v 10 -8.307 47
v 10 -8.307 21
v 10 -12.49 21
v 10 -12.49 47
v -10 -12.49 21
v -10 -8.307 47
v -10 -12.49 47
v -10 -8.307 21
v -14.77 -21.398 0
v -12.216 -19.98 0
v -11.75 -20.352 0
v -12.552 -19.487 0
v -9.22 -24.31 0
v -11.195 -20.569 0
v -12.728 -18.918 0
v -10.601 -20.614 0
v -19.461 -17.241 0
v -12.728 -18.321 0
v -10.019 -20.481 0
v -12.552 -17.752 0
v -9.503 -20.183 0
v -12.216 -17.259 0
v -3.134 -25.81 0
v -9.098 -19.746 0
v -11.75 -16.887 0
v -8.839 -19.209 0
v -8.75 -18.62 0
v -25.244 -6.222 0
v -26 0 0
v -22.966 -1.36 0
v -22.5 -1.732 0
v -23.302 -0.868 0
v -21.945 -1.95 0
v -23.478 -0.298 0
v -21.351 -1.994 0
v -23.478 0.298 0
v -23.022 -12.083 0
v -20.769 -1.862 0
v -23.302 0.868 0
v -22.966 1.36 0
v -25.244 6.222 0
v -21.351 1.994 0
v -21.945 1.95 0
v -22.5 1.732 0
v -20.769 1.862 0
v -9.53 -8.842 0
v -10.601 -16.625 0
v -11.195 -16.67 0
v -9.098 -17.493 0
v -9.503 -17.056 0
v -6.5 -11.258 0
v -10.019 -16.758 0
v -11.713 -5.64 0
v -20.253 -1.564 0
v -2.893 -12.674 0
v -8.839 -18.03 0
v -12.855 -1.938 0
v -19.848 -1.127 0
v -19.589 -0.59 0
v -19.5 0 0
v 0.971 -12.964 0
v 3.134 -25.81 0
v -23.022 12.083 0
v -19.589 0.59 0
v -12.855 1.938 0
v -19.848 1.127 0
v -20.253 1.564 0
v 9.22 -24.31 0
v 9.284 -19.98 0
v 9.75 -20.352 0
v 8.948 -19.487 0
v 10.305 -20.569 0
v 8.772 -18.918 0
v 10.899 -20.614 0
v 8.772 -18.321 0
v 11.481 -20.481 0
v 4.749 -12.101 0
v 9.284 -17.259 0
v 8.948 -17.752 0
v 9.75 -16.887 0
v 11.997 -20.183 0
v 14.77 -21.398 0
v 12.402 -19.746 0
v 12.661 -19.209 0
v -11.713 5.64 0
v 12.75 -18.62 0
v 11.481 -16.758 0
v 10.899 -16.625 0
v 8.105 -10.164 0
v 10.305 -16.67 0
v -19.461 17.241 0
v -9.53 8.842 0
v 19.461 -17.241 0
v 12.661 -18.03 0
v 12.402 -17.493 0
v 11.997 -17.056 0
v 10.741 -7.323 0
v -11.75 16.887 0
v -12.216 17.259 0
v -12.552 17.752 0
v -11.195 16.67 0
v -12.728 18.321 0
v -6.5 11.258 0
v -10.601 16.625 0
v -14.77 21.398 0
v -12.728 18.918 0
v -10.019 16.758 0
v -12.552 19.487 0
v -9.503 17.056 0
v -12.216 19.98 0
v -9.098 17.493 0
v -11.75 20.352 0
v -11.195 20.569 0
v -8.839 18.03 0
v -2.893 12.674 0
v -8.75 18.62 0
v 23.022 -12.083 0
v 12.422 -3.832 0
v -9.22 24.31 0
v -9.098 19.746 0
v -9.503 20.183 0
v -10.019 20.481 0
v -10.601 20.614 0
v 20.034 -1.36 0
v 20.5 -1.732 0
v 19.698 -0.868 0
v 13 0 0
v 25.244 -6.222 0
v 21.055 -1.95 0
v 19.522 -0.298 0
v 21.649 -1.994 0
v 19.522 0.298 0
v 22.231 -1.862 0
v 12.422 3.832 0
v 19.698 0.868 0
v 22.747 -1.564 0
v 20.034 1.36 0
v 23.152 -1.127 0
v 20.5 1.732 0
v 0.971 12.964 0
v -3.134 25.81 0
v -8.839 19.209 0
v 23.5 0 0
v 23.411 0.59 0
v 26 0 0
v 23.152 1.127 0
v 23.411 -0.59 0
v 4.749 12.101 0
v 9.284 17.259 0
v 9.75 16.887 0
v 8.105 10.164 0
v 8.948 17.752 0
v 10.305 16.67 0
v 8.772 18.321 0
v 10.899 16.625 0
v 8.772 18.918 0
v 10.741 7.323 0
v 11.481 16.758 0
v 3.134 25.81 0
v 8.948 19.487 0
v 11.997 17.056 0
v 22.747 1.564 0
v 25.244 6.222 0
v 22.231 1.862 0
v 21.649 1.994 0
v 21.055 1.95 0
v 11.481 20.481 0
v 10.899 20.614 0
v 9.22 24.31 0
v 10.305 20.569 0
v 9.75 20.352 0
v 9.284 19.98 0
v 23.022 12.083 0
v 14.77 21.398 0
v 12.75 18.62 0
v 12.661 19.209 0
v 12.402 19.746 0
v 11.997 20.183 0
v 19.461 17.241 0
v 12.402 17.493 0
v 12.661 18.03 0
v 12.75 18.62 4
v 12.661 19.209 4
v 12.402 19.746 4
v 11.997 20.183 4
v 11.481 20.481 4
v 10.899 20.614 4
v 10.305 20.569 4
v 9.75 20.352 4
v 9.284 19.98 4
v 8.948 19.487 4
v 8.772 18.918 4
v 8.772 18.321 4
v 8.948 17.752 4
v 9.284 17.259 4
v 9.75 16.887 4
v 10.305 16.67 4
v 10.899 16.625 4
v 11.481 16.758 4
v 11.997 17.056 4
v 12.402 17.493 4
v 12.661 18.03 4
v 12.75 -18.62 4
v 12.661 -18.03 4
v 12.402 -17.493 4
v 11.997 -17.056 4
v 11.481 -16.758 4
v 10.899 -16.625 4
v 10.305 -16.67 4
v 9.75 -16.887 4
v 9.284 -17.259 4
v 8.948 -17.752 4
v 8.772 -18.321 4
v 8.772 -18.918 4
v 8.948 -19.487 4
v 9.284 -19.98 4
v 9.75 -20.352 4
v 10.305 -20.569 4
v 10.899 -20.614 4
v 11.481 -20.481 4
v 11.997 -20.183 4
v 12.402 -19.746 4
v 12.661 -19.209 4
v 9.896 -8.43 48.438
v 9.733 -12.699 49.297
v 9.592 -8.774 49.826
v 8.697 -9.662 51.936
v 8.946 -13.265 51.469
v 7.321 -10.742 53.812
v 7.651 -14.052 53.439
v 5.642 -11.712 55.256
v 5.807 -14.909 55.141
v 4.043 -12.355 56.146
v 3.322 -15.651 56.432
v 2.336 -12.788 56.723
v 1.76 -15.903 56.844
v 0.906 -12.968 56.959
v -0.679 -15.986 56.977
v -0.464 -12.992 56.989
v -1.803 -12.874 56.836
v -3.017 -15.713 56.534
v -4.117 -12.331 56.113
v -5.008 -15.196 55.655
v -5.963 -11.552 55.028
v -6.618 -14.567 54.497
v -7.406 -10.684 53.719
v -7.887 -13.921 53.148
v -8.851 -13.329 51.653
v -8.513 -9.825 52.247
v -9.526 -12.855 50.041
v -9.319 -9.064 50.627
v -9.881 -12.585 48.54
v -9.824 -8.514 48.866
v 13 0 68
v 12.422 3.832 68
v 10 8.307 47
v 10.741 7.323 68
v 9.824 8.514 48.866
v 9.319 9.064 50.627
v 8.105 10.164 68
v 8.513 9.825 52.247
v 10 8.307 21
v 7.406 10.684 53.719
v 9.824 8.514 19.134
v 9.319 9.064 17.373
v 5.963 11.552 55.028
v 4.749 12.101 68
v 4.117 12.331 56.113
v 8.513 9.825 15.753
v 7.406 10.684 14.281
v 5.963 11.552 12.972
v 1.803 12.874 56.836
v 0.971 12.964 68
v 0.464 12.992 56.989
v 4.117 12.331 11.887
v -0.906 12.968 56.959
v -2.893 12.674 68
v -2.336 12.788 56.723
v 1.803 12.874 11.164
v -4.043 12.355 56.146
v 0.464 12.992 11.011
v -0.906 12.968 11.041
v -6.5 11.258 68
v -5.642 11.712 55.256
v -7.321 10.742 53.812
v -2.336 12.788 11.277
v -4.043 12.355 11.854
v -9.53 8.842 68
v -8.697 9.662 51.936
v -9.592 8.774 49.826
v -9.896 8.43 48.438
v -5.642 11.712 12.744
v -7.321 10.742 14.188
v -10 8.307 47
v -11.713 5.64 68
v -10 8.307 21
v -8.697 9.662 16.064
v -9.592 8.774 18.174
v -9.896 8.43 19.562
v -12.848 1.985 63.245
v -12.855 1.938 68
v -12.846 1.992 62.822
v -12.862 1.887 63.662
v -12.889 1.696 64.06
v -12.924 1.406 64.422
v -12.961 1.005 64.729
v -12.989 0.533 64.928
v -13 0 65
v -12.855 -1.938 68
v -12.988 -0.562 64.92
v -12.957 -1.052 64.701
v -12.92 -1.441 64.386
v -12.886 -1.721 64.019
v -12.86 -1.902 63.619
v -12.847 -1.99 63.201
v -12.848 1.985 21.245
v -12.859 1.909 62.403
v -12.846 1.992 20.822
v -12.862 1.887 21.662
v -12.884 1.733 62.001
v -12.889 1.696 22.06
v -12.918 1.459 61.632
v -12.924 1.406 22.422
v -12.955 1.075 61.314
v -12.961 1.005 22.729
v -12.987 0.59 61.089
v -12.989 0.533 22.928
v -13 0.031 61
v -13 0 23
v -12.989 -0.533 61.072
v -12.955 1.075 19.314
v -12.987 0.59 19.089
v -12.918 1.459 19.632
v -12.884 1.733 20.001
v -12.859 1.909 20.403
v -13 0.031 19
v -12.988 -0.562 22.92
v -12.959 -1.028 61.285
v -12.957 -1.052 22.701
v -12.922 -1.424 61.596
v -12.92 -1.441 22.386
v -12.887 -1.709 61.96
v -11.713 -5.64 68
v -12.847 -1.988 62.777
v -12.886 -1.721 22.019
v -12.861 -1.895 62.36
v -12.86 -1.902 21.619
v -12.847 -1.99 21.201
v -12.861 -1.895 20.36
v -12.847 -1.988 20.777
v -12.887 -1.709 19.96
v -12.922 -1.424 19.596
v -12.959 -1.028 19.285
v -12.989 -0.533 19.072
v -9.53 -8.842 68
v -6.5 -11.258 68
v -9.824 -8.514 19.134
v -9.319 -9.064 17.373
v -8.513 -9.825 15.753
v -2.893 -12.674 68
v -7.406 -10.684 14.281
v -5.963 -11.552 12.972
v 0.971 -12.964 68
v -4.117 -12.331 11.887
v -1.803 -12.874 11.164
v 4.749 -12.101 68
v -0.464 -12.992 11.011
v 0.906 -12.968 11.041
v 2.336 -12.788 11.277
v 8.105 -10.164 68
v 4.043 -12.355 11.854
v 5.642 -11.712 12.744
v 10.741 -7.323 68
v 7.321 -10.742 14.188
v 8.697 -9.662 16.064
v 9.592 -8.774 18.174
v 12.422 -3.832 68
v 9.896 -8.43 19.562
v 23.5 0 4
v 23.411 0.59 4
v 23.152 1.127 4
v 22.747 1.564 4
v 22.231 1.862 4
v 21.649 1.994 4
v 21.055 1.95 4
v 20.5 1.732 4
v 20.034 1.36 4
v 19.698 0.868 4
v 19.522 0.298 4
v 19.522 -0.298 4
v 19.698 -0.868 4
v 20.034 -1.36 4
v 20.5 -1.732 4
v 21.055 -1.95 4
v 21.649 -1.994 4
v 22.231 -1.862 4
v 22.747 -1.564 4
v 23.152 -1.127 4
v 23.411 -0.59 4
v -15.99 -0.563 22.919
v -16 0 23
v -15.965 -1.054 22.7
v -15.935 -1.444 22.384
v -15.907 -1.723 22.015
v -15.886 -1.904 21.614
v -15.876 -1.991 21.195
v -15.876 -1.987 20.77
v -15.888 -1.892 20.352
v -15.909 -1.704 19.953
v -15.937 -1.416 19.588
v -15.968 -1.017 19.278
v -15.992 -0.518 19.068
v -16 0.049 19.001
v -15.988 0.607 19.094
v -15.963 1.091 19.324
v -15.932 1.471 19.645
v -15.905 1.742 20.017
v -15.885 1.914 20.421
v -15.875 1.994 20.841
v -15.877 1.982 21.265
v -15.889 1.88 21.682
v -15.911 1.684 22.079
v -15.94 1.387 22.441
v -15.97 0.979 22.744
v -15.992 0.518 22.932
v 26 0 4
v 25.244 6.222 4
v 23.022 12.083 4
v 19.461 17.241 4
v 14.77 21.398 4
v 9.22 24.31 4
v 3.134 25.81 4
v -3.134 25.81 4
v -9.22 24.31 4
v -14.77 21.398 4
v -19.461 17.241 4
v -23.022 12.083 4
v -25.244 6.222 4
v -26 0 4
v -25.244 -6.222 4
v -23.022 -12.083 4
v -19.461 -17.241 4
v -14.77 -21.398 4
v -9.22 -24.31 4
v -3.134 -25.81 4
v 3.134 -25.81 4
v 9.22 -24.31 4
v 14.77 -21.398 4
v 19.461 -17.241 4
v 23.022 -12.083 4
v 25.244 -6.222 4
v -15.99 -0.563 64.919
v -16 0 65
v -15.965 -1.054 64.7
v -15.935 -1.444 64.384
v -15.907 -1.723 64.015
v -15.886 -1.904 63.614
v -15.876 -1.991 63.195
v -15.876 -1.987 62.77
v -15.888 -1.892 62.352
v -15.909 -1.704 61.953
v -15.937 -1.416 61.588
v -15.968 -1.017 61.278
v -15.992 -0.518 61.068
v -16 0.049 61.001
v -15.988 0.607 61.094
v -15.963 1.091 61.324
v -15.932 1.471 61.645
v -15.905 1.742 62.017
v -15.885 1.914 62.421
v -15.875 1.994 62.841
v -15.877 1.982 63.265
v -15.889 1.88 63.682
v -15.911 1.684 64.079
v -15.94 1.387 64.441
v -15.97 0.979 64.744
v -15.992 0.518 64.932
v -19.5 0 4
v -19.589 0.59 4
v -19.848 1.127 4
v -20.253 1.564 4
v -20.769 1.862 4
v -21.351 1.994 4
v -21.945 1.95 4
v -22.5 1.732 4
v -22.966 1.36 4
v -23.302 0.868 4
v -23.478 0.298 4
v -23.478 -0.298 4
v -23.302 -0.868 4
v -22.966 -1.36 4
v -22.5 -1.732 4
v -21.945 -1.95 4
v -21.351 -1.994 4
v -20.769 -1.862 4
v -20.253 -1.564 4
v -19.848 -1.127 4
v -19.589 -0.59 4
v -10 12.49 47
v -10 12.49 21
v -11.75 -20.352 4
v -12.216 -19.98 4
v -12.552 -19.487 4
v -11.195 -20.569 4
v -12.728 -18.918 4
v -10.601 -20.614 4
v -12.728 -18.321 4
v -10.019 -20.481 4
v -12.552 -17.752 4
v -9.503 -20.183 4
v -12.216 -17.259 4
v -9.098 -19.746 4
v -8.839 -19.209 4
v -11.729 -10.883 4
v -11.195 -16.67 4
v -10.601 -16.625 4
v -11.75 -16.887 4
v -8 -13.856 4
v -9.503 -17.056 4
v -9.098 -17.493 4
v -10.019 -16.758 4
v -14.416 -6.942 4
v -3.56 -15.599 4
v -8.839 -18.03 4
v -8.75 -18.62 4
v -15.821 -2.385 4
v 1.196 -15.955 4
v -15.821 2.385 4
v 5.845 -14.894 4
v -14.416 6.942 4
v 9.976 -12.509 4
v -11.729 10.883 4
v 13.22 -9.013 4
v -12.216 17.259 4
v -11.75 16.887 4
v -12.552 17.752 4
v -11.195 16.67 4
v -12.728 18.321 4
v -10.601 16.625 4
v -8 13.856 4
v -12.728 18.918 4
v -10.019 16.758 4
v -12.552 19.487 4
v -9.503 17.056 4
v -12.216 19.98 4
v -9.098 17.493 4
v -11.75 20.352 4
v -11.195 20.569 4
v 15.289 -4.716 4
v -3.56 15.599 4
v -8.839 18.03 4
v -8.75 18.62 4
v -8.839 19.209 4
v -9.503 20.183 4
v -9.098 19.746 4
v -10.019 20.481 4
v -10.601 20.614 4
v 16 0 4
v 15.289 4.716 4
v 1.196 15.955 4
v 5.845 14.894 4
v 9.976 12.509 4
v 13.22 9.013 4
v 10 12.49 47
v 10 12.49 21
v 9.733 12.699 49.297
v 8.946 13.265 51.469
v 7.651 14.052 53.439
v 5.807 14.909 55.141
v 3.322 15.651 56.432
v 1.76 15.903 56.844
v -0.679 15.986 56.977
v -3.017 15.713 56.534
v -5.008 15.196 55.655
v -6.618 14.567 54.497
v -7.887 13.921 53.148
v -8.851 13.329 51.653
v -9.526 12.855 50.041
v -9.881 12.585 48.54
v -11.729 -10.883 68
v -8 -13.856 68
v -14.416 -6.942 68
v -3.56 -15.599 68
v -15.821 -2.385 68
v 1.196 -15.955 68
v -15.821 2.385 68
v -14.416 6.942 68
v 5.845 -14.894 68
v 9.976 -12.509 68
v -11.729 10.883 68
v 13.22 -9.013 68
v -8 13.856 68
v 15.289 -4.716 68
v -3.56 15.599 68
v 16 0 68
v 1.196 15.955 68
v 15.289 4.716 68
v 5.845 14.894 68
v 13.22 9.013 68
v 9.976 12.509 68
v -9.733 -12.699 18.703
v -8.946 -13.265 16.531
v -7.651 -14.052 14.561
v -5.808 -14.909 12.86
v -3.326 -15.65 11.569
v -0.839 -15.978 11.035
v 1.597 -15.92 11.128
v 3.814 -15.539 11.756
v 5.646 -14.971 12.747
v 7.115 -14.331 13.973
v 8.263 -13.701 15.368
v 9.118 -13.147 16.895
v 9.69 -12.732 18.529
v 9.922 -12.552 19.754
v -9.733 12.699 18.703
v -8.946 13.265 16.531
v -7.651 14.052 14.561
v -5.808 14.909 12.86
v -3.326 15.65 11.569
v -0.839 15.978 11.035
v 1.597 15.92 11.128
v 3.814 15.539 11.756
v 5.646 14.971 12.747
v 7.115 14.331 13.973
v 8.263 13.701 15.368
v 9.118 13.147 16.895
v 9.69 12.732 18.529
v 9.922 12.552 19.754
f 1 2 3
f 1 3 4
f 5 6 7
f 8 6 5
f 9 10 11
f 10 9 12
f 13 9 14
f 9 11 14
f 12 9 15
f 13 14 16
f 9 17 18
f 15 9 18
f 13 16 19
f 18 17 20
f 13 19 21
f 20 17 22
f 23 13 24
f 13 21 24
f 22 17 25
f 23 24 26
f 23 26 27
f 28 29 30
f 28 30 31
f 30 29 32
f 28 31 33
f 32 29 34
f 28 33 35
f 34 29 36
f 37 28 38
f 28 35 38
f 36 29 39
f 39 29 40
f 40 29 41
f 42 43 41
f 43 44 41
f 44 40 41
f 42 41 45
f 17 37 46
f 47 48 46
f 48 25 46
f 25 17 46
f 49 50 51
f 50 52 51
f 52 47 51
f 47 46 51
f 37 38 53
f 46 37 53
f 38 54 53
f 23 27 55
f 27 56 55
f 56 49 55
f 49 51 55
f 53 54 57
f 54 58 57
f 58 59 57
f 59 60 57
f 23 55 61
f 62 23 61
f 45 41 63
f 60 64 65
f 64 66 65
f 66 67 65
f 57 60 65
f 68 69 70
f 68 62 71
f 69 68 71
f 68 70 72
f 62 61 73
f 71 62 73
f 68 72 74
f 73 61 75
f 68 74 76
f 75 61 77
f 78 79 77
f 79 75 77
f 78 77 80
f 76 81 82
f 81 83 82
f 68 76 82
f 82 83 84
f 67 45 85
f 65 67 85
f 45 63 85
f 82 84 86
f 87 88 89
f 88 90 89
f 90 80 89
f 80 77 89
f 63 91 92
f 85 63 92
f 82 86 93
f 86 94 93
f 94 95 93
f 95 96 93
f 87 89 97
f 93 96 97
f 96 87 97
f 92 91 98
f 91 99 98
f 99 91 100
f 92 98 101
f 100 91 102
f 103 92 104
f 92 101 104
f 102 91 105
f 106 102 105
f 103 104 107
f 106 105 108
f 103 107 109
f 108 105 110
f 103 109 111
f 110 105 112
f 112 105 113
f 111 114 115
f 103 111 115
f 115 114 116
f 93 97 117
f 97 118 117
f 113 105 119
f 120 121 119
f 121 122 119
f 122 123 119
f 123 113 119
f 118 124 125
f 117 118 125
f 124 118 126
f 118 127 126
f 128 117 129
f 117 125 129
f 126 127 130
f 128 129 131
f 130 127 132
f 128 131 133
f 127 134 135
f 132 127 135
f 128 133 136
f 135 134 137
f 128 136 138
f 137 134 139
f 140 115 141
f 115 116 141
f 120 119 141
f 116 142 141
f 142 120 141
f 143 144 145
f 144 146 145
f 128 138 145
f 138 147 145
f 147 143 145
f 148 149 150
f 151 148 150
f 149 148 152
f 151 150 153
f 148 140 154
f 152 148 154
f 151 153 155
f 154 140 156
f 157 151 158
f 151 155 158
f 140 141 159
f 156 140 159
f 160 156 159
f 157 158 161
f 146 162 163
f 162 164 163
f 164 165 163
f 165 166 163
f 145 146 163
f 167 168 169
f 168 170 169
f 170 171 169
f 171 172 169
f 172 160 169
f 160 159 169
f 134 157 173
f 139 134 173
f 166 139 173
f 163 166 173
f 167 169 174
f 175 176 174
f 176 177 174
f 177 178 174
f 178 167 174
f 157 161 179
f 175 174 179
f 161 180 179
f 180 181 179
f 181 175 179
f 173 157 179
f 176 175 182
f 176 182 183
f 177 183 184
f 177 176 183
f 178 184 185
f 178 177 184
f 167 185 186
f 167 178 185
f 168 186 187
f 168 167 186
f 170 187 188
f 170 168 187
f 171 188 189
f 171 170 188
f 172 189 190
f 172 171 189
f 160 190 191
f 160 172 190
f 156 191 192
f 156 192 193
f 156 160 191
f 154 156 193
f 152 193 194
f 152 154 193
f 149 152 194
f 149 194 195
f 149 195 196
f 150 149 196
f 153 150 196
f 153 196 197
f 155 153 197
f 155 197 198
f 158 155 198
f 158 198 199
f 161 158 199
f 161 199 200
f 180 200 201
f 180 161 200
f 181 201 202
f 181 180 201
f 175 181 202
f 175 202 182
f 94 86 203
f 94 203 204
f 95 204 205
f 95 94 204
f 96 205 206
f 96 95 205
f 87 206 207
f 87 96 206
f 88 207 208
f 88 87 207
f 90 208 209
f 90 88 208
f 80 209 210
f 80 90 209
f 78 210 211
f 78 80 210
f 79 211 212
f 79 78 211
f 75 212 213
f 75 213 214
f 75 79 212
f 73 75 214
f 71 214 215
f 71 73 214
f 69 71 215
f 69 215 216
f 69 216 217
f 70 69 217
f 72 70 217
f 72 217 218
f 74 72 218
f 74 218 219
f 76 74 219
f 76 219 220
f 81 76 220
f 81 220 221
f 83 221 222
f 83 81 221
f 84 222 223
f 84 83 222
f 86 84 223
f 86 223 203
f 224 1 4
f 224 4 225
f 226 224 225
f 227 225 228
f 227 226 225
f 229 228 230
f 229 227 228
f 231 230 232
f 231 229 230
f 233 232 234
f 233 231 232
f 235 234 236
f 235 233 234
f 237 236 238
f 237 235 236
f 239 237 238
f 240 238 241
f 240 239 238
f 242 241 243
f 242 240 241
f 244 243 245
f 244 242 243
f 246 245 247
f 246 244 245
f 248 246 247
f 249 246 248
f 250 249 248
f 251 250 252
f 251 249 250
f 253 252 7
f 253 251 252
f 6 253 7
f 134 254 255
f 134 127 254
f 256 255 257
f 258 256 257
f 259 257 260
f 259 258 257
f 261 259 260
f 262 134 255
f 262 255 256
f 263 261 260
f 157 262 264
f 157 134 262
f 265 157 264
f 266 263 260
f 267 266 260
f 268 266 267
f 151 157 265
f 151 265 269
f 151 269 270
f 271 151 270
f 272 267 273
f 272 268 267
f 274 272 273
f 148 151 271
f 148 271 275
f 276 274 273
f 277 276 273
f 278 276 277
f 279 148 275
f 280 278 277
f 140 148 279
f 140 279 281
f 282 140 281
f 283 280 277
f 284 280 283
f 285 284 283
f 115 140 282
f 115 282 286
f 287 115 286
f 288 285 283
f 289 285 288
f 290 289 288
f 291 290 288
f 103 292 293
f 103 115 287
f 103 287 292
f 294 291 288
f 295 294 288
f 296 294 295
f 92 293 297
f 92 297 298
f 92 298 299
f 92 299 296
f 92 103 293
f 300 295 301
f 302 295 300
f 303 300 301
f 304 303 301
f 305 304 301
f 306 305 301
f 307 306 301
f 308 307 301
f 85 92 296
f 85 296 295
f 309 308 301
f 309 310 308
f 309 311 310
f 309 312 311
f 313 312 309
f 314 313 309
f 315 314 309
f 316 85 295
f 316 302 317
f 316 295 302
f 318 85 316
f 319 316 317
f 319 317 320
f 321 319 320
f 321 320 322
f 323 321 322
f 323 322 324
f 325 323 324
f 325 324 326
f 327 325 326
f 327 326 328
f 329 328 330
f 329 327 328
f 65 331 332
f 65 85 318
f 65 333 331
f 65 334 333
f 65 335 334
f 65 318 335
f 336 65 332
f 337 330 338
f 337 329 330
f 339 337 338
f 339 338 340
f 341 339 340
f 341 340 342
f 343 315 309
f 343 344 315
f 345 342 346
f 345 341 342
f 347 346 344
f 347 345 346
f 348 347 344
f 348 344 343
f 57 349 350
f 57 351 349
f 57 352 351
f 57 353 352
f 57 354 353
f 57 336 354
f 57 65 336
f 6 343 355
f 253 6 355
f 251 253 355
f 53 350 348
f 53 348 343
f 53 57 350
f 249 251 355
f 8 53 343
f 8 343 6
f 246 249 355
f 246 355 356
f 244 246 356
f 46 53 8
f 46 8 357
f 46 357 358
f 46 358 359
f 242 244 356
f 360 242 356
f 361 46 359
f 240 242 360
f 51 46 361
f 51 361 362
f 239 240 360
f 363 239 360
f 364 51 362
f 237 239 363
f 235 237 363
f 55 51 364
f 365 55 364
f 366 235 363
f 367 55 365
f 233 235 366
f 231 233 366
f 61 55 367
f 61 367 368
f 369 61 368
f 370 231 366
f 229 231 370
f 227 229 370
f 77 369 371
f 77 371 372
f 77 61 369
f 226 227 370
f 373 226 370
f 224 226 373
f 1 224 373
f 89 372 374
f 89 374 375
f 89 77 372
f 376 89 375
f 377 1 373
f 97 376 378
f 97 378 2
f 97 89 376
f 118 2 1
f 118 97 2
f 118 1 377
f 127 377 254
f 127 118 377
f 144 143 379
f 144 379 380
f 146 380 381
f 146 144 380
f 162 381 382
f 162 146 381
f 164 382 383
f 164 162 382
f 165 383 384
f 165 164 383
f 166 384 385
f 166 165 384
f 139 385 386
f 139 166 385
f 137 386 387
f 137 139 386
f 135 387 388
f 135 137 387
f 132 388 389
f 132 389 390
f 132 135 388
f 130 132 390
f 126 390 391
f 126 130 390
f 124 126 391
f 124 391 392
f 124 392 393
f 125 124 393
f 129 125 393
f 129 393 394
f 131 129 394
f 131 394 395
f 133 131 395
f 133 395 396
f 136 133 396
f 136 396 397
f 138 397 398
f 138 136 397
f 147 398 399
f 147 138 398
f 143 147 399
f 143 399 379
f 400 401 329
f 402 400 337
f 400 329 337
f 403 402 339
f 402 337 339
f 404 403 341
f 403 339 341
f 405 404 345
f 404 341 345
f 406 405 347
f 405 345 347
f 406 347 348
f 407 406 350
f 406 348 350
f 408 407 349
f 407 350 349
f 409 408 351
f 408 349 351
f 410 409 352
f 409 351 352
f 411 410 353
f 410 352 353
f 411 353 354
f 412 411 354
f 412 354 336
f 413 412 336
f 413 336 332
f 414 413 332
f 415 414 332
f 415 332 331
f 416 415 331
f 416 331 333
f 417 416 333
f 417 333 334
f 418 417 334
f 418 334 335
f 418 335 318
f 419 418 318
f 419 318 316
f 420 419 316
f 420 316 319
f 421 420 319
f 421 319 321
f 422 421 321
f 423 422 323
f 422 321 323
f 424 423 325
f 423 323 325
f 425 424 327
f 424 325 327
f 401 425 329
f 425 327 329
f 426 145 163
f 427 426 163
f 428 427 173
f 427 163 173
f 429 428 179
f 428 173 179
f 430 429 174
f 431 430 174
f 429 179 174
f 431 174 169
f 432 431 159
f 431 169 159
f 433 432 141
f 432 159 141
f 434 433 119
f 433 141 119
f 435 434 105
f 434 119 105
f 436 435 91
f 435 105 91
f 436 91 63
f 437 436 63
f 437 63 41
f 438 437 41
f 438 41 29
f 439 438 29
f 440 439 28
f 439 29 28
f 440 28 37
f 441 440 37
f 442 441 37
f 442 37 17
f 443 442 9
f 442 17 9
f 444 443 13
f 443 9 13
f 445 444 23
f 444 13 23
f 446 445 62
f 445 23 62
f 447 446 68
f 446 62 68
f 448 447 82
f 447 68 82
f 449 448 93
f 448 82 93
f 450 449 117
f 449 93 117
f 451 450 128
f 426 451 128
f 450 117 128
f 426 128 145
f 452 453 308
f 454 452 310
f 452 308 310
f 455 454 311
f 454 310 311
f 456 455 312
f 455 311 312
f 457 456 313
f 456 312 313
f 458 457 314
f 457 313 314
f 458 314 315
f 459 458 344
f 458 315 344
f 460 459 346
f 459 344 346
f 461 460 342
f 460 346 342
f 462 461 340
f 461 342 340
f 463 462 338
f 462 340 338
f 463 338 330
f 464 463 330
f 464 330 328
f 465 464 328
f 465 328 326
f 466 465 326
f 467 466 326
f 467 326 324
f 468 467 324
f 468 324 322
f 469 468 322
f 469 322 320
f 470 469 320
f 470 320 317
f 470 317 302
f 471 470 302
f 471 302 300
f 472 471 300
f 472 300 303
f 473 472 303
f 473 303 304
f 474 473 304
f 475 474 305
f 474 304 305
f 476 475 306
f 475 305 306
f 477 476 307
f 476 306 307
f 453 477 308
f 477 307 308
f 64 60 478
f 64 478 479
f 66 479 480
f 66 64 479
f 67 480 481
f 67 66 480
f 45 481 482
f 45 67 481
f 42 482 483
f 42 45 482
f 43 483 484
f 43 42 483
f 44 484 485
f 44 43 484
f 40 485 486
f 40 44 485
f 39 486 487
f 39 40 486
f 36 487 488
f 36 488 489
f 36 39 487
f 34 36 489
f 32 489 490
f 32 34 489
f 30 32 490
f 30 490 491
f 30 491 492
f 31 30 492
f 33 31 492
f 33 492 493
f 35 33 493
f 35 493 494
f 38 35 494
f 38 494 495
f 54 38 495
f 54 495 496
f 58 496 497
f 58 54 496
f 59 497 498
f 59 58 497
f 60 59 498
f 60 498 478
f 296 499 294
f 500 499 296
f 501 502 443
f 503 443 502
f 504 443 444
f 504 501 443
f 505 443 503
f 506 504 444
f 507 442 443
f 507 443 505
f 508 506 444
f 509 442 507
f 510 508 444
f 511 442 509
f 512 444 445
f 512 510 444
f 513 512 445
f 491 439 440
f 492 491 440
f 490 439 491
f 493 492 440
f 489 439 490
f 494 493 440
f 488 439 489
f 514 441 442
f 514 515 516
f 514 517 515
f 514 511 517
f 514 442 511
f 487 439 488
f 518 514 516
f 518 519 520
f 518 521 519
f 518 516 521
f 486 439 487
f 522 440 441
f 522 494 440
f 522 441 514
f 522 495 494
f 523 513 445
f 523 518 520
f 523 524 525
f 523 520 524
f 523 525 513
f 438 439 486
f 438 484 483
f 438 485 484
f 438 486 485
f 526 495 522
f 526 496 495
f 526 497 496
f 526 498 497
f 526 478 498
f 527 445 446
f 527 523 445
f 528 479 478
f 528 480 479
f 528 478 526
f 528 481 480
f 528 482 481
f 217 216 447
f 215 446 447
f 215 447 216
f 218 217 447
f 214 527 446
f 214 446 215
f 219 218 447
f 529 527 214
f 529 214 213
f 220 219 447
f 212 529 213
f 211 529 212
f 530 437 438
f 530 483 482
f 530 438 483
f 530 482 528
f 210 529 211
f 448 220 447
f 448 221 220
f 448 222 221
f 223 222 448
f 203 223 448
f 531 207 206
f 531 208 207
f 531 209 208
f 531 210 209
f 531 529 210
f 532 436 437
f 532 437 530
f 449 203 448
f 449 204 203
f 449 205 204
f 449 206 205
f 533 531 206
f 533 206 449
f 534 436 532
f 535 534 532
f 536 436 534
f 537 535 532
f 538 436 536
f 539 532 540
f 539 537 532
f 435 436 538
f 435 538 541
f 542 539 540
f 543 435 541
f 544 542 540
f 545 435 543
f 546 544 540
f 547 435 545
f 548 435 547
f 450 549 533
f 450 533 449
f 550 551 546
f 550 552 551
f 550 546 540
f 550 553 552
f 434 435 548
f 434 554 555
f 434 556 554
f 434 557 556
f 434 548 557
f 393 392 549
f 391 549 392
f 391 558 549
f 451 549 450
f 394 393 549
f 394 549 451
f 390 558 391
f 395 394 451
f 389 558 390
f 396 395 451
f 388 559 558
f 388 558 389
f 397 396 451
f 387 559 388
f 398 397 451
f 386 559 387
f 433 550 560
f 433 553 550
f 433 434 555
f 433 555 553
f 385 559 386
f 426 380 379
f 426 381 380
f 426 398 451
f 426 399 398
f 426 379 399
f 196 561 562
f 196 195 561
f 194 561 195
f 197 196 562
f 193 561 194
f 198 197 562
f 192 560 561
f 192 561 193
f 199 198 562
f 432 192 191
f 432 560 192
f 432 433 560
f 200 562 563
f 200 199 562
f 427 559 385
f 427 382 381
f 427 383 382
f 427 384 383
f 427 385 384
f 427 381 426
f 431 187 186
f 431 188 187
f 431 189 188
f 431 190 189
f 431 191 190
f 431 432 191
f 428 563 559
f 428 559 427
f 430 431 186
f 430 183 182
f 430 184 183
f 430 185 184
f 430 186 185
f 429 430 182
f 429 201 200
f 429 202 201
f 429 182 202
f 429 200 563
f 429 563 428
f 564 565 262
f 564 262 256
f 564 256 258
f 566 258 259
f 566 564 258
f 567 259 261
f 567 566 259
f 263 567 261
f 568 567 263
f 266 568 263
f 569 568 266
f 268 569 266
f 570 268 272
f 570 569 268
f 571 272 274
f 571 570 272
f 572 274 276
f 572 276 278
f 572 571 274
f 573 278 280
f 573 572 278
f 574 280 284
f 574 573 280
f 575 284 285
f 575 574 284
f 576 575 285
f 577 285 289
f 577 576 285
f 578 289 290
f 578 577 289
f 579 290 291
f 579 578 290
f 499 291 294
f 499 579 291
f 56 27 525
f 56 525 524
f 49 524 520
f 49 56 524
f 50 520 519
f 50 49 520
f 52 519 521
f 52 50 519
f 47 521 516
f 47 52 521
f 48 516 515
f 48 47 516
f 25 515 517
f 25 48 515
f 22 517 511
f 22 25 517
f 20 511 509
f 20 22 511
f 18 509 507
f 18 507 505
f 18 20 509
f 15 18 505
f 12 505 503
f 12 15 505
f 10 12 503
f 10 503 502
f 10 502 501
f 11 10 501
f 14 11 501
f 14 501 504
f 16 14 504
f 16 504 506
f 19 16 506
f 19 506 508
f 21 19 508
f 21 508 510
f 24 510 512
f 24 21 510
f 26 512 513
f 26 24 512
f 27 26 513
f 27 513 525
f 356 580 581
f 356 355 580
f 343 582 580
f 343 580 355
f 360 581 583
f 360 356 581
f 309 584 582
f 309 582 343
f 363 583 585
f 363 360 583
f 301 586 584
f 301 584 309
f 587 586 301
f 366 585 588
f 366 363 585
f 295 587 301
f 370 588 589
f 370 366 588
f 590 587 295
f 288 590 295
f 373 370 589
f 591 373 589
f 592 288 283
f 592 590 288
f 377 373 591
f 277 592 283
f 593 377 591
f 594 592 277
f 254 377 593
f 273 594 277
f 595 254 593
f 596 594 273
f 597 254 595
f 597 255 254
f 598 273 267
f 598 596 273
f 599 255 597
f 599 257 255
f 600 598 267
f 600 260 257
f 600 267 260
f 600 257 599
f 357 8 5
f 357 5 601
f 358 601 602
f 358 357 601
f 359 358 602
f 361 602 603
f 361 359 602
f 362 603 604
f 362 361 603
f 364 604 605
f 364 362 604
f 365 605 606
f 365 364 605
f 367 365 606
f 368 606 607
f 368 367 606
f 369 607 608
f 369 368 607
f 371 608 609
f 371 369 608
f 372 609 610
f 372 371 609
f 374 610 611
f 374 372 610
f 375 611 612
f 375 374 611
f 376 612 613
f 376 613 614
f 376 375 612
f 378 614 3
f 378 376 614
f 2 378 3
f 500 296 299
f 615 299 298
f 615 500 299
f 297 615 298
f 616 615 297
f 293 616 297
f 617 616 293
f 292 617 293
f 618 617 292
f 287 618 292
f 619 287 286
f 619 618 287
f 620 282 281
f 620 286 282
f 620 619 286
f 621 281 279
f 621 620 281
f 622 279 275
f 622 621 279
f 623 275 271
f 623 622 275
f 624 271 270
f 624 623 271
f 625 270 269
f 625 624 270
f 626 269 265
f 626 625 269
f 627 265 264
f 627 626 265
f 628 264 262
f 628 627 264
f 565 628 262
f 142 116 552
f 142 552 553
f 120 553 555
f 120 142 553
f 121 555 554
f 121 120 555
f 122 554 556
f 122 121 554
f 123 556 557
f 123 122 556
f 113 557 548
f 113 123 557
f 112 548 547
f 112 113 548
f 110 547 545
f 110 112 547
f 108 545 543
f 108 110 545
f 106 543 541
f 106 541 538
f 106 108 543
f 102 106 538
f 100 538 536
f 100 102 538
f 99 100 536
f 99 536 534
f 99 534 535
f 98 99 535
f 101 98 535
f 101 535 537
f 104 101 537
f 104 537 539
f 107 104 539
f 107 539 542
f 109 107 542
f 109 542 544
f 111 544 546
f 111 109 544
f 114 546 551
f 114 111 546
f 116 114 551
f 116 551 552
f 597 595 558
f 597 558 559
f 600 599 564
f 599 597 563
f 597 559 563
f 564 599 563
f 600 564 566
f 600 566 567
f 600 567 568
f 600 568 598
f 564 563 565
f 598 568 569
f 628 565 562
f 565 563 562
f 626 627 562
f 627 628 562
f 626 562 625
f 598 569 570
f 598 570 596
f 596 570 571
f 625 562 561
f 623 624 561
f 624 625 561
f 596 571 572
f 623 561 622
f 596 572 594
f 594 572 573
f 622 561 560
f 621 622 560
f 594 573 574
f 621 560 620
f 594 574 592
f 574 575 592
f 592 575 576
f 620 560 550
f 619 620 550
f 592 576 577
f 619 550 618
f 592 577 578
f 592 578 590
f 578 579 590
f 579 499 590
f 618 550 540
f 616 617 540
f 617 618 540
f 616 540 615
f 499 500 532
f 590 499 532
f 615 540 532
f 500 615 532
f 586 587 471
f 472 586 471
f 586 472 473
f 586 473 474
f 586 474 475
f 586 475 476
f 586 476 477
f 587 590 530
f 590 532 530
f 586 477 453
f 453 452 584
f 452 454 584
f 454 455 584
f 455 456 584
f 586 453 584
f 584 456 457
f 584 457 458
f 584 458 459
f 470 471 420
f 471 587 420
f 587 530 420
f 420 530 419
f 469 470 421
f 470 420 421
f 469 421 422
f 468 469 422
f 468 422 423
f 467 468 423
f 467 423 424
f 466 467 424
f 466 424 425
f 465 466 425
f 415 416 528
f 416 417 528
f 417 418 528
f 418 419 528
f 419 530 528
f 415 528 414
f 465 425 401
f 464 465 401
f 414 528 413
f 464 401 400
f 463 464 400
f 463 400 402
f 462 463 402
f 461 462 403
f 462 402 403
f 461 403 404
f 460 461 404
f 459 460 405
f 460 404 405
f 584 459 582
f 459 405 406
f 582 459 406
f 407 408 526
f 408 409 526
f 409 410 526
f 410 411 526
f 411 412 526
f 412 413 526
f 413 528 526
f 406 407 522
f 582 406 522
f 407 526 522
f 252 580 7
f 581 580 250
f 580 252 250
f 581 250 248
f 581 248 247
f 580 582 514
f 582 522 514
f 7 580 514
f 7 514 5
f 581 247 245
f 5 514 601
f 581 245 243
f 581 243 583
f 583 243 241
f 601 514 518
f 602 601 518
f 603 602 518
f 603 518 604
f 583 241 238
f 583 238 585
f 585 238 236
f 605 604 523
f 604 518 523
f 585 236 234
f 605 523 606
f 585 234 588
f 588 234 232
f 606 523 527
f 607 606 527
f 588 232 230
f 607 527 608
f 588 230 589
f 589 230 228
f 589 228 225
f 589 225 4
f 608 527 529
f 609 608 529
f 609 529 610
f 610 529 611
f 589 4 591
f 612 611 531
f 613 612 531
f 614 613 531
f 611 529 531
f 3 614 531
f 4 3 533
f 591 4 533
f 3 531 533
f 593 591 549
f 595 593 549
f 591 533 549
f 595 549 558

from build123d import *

# Parameters (mm, degrees)
SKETCH1_R           = 26
SKETCH1_R_2         = 13
SKETCH1_R_3         = 2
BOSS_EXTRUDE1_DEPTH = 4
SKETCH2_R           = 16
SKETCH2_R_2         = 13
BOSS_EXTRUDE2_DEPTH = 64
CUT_EXTRUDE1_DEPTH  = 32
SKETCH4_R           = 2
CUT_EXTRUDE2_DEPTH  = 64


with BuildPart() as part:
    # Sketch1 → Boss-Extrude1 (new body)
    with BuildSketch(Plane.XY):
        Circle(SKETCH1_R)
        Circle(SKETCH1_R_2, mode=Mode.SUBTRACT)
        with Locations((-21.5, 0)):
            Circle(SKETCH1_R_3, mode=Mode.SUBTRACT)
        with Locations((-10.75, 18.619546181)):
            Circle(SKETCH1_R_3, mode=Mode.SUBTRACT)
        with Locations((10.75, 18.619546181)):
            Circle(SKETCH1_R_3, mode=Mode.SUBTRACT)
        with Locations((21.5, 0)):
            Circle(SKETCH1_R_3, mode=Mode.SUBTRACT)
        with Locations((10.75, -18.619546181)):
            Circle(SKETCH1_R_3, mode=Mode.SUBTRACT)
        with Locations((-10.75, -18.619546181)):
            Circle(SKETCH1_R_3, mode=Mode.SUBTRACT)
    extrude(amount=BOSS_EXTRUDE1_DEPTH)

    # Sketch2 → Boss-Extrude2 (add)
    with BuildSketch(Plane.XY.offset(4)):
        Circle(SKETCH2_R)
        Circle(SKETCH2_R_2, mode=Mode.SUBTRACT)
    extrude(amount=BOSS_EXTRUDE2_DEPTH)

    # Sketch3 → Cut-Extrude1 (cut, symmetric)
    with BuildSketch(Plane(origin=(0, 0, 0), x_dir=(1, 0, 0), z_dir=(0, 1, 0))):
        with BuildLine():
            Line((10, -21), (10, -47))
            ThreePointArc((10, -47), (0, -57), (-10, -47))
            Line((-10, -47), (-10, -21))
            ThreePointArc((-10, -21), (0, -11), (10, -21))
        make_face()
    extrude(amount=CUT_EXTRUDE1_DEPTH, both=True, mode=Mode.SUBTRACT)

    # Sketch4 → Cut-Extrude2 (cut)
    with BuildSketch(Plane(origin=(0, 0, 0), x_dir=(0, 0, -1), z_dir=(1, 0, 0))):
        with Locations(Location((-21, 0, 0), (0, 0, 180))):
            Circle(SKETCH4_R)
        with Locations(Location((-63, 0, 0), (0, 0, 180))):
            Circle(SKETCH4_R)
    extrude(amount=-CUT_EXTRUDE2_DEPTH, mode=Mode.SUBTRACT)


solid = part.part
